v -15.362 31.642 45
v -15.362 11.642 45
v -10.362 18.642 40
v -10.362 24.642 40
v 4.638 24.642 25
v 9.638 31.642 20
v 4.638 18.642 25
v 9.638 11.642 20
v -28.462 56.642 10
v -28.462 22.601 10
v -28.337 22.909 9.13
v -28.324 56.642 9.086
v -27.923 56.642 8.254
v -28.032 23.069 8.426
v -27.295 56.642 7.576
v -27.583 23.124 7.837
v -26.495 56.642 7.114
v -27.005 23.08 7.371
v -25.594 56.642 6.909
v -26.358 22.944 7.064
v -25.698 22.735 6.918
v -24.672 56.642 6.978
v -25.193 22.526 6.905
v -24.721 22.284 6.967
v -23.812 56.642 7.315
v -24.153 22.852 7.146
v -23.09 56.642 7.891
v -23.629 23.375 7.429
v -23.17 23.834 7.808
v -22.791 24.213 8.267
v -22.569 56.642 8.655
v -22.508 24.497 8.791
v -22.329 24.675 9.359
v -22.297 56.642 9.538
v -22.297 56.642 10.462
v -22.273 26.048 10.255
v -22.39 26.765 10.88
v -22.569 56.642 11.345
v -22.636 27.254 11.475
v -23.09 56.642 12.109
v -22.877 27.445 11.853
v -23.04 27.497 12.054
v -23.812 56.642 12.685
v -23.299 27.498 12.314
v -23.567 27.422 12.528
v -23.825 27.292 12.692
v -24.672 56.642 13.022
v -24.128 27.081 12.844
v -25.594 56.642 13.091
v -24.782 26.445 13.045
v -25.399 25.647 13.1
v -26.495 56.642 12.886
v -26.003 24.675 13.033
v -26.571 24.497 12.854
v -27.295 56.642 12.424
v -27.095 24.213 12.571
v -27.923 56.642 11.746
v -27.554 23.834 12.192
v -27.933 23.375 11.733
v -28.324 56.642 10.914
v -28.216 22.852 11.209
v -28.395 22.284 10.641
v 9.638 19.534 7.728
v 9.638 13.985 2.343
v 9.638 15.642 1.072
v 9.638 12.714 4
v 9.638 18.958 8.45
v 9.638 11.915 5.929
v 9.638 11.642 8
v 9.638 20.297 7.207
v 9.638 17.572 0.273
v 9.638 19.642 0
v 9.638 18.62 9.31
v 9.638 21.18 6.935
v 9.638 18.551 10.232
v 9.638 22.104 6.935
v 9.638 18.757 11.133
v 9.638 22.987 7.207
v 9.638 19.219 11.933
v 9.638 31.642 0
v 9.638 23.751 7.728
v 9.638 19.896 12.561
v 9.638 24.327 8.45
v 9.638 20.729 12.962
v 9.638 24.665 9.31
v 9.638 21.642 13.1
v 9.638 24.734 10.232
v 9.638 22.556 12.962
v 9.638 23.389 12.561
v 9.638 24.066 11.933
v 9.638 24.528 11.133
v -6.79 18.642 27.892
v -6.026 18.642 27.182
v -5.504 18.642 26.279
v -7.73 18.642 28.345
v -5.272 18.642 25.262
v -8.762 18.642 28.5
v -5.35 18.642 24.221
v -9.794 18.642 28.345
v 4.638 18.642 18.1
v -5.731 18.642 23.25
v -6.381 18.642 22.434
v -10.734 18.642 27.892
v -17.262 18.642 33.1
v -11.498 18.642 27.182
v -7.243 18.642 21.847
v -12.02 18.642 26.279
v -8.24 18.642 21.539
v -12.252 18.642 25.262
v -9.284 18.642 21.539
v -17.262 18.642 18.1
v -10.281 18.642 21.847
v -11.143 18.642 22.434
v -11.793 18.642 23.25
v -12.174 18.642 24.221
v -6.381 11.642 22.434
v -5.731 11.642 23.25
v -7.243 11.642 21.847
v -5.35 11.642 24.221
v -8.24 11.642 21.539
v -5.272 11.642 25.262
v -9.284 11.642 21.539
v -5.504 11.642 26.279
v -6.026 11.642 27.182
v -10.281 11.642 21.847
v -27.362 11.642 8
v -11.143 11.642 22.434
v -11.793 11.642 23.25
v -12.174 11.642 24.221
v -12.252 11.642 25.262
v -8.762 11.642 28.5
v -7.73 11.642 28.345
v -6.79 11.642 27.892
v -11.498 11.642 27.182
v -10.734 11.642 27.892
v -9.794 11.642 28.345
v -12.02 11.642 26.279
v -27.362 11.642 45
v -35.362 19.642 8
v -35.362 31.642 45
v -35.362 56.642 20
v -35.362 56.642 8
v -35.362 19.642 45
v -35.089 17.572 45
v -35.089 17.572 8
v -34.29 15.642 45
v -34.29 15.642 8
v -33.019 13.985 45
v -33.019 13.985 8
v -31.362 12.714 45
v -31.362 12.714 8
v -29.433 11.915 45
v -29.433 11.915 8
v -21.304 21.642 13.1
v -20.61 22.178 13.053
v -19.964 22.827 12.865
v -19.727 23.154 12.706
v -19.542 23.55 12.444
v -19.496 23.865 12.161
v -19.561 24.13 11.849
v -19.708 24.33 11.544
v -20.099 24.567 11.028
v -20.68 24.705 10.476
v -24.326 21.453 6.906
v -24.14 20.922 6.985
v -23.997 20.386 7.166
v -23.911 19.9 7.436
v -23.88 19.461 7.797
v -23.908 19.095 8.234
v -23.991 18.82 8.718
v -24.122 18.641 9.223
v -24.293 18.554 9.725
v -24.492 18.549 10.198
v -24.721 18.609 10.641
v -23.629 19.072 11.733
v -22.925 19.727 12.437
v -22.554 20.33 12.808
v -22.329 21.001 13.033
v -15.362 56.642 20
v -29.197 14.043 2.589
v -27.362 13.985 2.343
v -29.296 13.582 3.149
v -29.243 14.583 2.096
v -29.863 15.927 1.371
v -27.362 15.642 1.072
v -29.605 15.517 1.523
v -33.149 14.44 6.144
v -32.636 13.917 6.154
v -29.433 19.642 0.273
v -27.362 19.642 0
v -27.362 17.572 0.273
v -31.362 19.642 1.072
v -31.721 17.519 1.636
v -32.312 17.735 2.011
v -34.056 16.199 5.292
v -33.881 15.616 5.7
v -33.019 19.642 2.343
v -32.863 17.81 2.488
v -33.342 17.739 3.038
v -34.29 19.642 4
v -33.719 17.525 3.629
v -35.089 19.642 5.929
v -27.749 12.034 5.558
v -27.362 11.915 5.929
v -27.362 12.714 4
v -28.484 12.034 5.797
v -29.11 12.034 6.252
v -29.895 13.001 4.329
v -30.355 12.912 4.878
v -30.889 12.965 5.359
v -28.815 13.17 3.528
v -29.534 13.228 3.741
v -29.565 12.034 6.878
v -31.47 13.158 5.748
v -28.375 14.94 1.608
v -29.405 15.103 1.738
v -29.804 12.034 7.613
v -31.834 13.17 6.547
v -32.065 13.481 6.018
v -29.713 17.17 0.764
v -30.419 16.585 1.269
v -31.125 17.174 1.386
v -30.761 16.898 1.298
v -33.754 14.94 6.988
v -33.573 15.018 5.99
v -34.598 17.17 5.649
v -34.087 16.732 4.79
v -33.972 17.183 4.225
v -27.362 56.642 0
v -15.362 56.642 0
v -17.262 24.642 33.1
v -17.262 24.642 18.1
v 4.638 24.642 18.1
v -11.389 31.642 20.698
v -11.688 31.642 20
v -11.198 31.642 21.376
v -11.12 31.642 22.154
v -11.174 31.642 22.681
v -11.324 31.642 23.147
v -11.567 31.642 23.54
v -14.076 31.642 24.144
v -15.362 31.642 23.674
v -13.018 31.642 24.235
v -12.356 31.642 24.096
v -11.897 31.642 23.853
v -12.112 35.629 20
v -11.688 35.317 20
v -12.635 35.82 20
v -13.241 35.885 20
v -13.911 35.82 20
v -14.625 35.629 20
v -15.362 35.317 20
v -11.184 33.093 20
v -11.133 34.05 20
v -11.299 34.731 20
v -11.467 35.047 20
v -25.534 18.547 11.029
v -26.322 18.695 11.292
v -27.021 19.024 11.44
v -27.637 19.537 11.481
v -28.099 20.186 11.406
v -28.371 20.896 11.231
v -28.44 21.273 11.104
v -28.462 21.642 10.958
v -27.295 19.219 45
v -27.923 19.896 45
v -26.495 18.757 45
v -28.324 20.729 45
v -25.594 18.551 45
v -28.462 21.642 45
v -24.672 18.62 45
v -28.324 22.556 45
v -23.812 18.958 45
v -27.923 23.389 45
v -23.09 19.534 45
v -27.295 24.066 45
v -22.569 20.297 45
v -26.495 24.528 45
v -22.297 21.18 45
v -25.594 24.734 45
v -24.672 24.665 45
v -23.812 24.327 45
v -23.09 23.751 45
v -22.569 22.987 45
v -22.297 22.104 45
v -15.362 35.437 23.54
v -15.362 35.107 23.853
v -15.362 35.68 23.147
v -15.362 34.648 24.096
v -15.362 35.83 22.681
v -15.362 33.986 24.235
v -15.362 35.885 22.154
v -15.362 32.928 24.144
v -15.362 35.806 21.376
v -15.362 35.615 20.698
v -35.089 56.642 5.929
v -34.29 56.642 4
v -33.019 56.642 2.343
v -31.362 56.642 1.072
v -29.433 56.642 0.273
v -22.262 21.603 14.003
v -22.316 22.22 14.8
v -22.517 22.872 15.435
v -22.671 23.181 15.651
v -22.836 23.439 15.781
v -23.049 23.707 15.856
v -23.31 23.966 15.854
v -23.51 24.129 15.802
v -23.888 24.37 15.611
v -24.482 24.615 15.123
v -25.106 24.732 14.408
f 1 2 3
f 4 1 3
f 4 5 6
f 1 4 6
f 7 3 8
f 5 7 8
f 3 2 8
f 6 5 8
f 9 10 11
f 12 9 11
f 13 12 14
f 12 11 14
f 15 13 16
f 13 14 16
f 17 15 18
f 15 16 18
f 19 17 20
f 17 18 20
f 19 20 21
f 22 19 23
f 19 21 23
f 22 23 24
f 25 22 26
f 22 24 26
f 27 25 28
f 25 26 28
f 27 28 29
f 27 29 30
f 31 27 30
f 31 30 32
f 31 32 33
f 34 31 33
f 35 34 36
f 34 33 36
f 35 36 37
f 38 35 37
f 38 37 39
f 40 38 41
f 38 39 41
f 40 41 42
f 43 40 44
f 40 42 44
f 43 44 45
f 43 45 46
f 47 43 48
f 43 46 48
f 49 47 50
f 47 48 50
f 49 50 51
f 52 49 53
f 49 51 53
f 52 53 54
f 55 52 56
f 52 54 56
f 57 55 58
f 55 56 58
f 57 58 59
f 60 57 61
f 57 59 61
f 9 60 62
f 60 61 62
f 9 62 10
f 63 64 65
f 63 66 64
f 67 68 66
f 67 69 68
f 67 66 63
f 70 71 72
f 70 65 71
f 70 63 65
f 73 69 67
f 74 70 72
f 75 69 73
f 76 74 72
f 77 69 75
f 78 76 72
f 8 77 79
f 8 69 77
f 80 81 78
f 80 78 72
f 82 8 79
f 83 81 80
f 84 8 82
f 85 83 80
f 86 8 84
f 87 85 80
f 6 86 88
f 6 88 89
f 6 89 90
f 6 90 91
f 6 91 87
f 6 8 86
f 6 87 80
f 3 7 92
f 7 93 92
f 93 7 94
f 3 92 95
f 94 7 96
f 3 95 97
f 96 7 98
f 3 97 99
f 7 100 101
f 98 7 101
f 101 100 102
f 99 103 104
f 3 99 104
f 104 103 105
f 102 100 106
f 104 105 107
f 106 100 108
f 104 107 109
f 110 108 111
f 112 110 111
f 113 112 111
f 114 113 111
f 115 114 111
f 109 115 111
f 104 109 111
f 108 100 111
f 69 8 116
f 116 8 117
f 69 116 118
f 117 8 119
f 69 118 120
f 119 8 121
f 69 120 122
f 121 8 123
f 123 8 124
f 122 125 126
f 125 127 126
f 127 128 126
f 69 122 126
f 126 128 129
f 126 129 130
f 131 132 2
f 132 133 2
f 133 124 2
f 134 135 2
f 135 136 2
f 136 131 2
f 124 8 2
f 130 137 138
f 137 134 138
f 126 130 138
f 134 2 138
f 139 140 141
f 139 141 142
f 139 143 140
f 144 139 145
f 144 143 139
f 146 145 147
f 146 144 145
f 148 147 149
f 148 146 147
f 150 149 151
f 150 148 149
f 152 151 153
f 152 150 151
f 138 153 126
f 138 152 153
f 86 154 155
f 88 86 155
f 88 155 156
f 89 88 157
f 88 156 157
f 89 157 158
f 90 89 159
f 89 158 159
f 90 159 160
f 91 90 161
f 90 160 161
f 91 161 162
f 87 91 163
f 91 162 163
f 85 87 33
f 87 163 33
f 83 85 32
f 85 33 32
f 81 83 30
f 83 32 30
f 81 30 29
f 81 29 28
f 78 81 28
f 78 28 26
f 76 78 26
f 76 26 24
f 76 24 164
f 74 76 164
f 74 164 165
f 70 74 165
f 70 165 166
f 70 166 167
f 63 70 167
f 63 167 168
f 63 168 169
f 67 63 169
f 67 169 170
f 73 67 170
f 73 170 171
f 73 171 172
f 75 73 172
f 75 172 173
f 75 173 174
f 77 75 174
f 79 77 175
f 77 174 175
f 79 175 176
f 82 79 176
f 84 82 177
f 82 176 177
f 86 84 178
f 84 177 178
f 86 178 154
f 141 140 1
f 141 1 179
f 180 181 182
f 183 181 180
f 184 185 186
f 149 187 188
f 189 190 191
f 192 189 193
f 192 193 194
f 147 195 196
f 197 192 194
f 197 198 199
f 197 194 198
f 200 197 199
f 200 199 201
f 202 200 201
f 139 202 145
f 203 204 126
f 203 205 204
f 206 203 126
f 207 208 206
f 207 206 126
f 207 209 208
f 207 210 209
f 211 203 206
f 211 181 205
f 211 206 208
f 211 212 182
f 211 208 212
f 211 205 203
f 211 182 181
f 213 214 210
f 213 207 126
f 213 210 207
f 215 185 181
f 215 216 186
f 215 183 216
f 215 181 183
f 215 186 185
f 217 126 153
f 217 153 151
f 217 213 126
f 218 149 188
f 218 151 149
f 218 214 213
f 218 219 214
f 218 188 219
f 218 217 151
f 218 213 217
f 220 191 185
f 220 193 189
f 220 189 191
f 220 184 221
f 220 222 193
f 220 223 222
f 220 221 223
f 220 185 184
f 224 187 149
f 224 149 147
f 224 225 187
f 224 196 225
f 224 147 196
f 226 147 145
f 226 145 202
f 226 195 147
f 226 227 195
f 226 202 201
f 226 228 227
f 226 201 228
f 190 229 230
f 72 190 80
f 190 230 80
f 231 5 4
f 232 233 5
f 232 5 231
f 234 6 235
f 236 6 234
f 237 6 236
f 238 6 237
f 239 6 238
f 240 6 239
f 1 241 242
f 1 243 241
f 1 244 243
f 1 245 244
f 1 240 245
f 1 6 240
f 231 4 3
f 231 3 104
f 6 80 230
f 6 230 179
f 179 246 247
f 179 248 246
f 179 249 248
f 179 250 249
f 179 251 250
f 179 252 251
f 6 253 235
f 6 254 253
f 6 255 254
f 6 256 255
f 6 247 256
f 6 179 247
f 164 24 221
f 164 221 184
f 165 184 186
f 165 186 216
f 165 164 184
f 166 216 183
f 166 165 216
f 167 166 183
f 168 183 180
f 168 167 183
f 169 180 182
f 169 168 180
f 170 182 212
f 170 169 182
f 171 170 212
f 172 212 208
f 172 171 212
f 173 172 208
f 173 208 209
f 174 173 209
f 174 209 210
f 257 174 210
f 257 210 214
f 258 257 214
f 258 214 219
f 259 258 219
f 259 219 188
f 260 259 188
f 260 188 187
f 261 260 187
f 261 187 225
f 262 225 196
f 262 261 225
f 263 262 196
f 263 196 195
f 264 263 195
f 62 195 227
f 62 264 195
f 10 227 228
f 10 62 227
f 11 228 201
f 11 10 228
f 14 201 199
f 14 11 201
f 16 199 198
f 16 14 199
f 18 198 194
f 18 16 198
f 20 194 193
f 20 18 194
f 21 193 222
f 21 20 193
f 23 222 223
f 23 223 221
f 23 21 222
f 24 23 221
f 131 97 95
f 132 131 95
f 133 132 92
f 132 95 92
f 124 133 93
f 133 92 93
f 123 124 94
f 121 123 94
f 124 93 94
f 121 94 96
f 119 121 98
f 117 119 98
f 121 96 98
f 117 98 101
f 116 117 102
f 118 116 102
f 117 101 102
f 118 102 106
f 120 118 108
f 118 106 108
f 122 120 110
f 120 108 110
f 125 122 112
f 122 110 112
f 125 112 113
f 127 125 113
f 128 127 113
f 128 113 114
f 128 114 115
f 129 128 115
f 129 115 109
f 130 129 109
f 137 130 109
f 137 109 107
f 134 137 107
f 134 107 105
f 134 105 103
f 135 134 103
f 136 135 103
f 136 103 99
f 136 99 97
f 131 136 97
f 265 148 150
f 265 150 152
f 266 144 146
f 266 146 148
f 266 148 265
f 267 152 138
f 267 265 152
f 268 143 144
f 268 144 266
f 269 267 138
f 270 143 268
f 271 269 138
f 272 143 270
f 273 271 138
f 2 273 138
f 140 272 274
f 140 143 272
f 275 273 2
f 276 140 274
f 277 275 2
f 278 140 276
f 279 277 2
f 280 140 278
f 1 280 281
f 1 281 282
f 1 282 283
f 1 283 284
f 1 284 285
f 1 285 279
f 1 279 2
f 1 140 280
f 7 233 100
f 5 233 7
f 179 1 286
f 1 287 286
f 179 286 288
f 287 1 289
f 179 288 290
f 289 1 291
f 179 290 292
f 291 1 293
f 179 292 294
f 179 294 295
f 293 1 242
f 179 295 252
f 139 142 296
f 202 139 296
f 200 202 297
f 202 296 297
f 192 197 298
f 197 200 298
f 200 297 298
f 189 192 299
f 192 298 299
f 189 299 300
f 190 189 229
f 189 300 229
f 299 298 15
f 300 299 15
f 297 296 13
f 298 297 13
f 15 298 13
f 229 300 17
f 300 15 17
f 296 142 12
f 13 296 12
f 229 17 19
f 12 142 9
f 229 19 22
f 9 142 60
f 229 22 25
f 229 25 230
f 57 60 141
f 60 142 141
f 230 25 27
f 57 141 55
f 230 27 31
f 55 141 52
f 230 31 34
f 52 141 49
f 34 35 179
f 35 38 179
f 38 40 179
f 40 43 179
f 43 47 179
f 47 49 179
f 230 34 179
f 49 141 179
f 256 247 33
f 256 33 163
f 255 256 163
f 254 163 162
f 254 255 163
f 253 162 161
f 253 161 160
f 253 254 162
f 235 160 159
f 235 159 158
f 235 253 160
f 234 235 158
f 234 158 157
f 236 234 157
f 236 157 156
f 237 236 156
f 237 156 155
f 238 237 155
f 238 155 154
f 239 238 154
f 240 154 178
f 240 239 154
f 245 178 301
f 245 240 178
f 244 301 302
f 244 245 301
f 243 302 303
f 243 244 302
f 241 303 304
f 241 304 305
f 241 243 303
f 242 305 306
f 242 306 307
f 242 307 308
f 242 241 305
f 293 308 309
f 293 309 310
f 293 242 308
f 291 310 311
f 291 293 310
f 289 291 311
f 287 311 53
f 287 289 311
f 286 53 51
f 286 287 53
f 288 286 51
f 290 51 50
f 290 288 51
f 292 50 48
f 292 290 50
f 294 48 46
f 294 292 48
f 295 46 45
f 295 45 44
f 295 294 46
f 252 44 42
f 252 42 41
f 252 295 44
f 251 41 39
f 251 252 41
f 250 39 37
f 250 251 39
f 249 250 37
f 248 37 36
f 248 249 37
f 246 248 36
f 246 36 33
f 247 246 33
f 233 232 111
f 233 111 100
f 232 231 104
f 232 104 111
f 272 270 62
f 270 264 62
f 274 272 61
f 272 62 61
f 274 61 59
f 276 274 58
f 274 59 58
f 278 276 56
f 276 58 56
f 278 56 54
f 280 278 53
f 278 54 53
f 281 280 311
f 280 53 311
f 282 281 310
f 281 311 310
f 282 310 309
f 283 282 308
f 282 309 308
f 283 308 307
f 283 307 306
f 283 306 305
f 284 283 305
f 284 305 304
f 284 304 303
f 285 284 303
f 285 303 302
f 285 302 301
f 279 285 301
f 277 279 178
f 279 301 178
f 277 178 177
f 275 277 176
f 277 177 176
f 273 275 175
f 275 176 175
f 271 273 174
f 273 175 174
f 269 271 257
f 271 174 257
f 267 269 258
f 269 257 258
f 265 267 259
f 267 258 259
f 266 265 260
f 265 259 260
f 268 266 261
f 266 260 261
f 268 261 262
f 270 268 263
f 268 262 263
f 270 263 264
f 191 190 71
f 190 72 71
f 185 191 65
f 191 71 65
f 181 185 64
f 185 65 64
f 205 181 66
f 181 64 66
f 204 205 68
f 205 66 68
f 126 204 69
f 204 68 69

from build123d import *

# Parameters (mm, degrees)
ESBO_O1_W                        = 45
ESBO_O1_H                        = 45
RESSALTO_EXTRUS_O1_DEPTH         = 20
ESBO_O2_W                        = 25
ESBO_O2_H                        = 25
CORTE_EXTRUS_O1_DEPTH            = 70.705238631
ESBO_O3_W                        = 20
ESBO_O3_H                        = 20
RESSALTO_EXTRUS_O2_DEPTH         = 25
FURO_DE_DI_METRO_6_2_6_2_1_D     = 6.2
FURO_DE_DI_METRO_6_2_6_2_1_DEPTH = 35
FURO_DE_DI_METRO_6_2_6_2_2_D     = 6.2
FURO_DE_DI_METRO_6_2_6_2_2_DEPTH = 35
FURO_DE_DI_METRO_6_2_6_2_3_D     = 6.2
FURO_DE_DI_METRO_6_2_6_2_3_DEPTH = 35
FILETE2_R                        = 8
CHANFRO1_SIZE                    = 25
CHANFRO2_SIZE                    = 25
RESSALTO_EXTRUS_O3_DEPTH         = 20
ESBO_O12_R                       = 3
CORTE_EXTRUS_O2_DEPTH            = 71.906960985
CORTE_EXTRUS_O5_DEPTH            = 3
CORTE_EXTRUS_O5_DEPTH_BACK       = 3
ESBO_O18_R                       = 3.5
CORTE_EXTRUS_O6_DEPTH            = 69.698424668


# Some blends are built 0.0001 mm under size
with BuildPart() as part:
    # Esboço1 → Ressalto-extrusão1 (new body)
    with BuildSketch(Plane.XY.offset(20)):
        with Locations((-12.862035225, 34.142270059)):
            Rectangle(ESBO_O1_W, ESBO_O1_H)
    extrude(amount=-RESSALTO_EXTRUS_O1_DEPTH)

    # Esboço2 → Corte-extrusão1 (cut, through all)
    with BuildSketch(Plane(origin=(0, 0, 0), x_dir=(-1, 0, 0), z_dir=(0, 0, -1))):
        with Locations((2.862035225, 44.142270059)):
            Rectangle(ESBO_O2_W, ESBO_O2_H)
    extrude(amount=-CORTE_EXTRUS_O1_DEPTH, mode=Mode.SUBTRACT)

    # Esboço3 → Ressalto-extrusão2 (add)
    with BuildSketch(Plane.XY.offset(20)):
        with Locations((-25.362035225, 21.642270059)):
            Rectangle(ESBO_O3_W, ESBO_O3_H)
    extrude(amount=RESSALTO_EXTRUS_O2_DEPTH)

    # Furo de diâmetro Ø6.2 (6.2)1
    with Locations(Plane(origin=(9.637964775, 0, 0), x_dir=(0, 0, -1), z_dir=(1, 0, 0))):
        with Locations((-10, 21.642270059)):
            Hole(FURO_DE_DI_METRO_6_2_6_2_1_D / 2, depth=FURO_DE_DI_METRO_6_2_6_2_1_DEPTH)

    # Furo de diâmetro Ø6.2 (6.2)2
    with Locations(Plane(origin=(0, 56.642270059, 0), x_dir=(1, 0, 0), z_dir=(0, 1, 0))):
        with Locations((-25.362035225, -10)):
            Hole(FURO_DE_DI_METRO_6_2_6_2_2_D / 2, depth=FURO_DE_DI_METRO_6_2_6_2_2_DEPTH)

    # Furo de diâmetro Ø6.2 (6.2)3
    with Locations(Plane.XY.offset(45)):
        with Locations((-25.362035225, 21.642270059)):
            Hole(FURO_DE_DI_METRO_6_2_6_2_3_D / 2, depth=FURO_DE_DI_METRO_6_2_6_2_3_DEPTH)

    # Filete2
    filete2_edges = [part.edges().sort_by_distance(p)[0] for p in [
        (-35.362035225, 34.142270059, 0),
        (-12.862035225, 11.642270059, 0),
        (-35.362035225, 11.642270059, 22.5),
    ]]
    fillet(filete2_edges, radius=FILETE2_R)

    # Chanfro1
    # the kernel refuses this chamfer: 25 mm, written as the material it adds along each edge
    with BuildSketch(Plane(origin=(-35.362035225, 31.642270059, 20), x_dir=(0, -0.027495876610586317, 0.9996219169112966), z_dir=(1, 0, 0))) as chanfro1_piece_1_section:
        Polygon((CHANFRO1_SIZE * 0.999621916911, -CHANFRO1_SIZE * 0.0274958766106), (-CHANFRO1_SIZE * 0.0274958766106, -CHANFRO1_SIZE * 0.999621916911), (0, 0), align=None)
    chanfro1_piece_1 = extrude(amount=20, mode=Mode.PRIVATE)
    chanfro1_piece_1 = split(chanfro1_piece_1, bisect_by=Plane(origin=(-25.362035225, 39.873368248, 45), z_dir=(0, 0, -1)), keep=Keep.TOP, mode=Mode.PRIVATE)
    chanfro1_piece_1 = split(chanfro1_piece_1, bisect_by=Plane(origin=(-25.362035225, 56.642270059, 28.231098189), z_dir=(0, -1, 0)), keep=Keep.TOP, mode=Mode.PRIVATE)
    add(chanfro1_piece_1)

    # Chanfro2
    chanfro2_edges = [part.edges().sort_by_distance(p)[0] for p in [
        (-15.362035225, 31.642270059, 10),
    ]]
    chamfer(chanfro2_edges, length=CHANFRO2_SIZE - 0.0001)  # a hair under: the kernel refuses the full size

    # Esboço10 → Ressalto-extrusão3 (add)
    with BuildSketch(Plane.XZ.offset(-11.642270059)):
        Polygon((-15.362035225, 45), (9.637964775, 20), (-15.362035225, 20), align=None)
    extrude(amount=-RESSALTO_EXTRUS_O3_DEPTH)

    # Esboço12 → Corte-extrusão2 (cut, through all)
    with BuildSketch(Plane(origin=(20.426744945, 20.426744945, 20.426744945), x_dir=(-0.8164965809277259, 0.408248290463863, 0.4082482904638632), z_dir=(-0.577350269189626, -0.5773502691896256, -0.5773502691896258))):
        with Locations(Location((33.625917704, 8.232328107, 0), (0, 0, 120.000005232))):
            Circle(ESBO_O12_R)
    extrude(amount=CORTE_EXTRUS_O2_DEPTH, mode=Mode.SUBTRACT)

    # Esboço16 → Corte-extrusão5 (cut, two sides: drawn at the far end of the back side and taken through both)
    with BuildSketch(Plane(origin=(0, 21.642270059, 0), x_dir=(-1, 0, 0), z_dir=(0, -1, 0)).offset(-CORTE_EXTRUS_O5_DEPTH_BACK)):
        Polygon((10.362035225, -40), (17.262035225, -33.1), (17.262035225, -18.1), (-4.637964775, -18.1), (-4.637964775, -25), align=None)
    extrude(amount=CORTE_EXTRUS_O5_DEPTH + CORTE_EXTRUS_O5_DEPTH_BACK, mode=Mode.SUBTRACT)

    # Esboço18 → Corte-extrusão6 (cut, through all)
    with BuildSketch(Plane(origin=(0, 18.642270059, 0), x_dir=(1, 0, 0), z_dir=(0, 1, 0))):
        with Locations(Location((-8.762035225, -25, 0), (0, 0, 270))):
            Circle(ESBO_O18_R)
    extrude(amount=-CORTE_EXTRUS_O6_DEPTH, mode=Mode.SUBTRACT)


solid = part.part
